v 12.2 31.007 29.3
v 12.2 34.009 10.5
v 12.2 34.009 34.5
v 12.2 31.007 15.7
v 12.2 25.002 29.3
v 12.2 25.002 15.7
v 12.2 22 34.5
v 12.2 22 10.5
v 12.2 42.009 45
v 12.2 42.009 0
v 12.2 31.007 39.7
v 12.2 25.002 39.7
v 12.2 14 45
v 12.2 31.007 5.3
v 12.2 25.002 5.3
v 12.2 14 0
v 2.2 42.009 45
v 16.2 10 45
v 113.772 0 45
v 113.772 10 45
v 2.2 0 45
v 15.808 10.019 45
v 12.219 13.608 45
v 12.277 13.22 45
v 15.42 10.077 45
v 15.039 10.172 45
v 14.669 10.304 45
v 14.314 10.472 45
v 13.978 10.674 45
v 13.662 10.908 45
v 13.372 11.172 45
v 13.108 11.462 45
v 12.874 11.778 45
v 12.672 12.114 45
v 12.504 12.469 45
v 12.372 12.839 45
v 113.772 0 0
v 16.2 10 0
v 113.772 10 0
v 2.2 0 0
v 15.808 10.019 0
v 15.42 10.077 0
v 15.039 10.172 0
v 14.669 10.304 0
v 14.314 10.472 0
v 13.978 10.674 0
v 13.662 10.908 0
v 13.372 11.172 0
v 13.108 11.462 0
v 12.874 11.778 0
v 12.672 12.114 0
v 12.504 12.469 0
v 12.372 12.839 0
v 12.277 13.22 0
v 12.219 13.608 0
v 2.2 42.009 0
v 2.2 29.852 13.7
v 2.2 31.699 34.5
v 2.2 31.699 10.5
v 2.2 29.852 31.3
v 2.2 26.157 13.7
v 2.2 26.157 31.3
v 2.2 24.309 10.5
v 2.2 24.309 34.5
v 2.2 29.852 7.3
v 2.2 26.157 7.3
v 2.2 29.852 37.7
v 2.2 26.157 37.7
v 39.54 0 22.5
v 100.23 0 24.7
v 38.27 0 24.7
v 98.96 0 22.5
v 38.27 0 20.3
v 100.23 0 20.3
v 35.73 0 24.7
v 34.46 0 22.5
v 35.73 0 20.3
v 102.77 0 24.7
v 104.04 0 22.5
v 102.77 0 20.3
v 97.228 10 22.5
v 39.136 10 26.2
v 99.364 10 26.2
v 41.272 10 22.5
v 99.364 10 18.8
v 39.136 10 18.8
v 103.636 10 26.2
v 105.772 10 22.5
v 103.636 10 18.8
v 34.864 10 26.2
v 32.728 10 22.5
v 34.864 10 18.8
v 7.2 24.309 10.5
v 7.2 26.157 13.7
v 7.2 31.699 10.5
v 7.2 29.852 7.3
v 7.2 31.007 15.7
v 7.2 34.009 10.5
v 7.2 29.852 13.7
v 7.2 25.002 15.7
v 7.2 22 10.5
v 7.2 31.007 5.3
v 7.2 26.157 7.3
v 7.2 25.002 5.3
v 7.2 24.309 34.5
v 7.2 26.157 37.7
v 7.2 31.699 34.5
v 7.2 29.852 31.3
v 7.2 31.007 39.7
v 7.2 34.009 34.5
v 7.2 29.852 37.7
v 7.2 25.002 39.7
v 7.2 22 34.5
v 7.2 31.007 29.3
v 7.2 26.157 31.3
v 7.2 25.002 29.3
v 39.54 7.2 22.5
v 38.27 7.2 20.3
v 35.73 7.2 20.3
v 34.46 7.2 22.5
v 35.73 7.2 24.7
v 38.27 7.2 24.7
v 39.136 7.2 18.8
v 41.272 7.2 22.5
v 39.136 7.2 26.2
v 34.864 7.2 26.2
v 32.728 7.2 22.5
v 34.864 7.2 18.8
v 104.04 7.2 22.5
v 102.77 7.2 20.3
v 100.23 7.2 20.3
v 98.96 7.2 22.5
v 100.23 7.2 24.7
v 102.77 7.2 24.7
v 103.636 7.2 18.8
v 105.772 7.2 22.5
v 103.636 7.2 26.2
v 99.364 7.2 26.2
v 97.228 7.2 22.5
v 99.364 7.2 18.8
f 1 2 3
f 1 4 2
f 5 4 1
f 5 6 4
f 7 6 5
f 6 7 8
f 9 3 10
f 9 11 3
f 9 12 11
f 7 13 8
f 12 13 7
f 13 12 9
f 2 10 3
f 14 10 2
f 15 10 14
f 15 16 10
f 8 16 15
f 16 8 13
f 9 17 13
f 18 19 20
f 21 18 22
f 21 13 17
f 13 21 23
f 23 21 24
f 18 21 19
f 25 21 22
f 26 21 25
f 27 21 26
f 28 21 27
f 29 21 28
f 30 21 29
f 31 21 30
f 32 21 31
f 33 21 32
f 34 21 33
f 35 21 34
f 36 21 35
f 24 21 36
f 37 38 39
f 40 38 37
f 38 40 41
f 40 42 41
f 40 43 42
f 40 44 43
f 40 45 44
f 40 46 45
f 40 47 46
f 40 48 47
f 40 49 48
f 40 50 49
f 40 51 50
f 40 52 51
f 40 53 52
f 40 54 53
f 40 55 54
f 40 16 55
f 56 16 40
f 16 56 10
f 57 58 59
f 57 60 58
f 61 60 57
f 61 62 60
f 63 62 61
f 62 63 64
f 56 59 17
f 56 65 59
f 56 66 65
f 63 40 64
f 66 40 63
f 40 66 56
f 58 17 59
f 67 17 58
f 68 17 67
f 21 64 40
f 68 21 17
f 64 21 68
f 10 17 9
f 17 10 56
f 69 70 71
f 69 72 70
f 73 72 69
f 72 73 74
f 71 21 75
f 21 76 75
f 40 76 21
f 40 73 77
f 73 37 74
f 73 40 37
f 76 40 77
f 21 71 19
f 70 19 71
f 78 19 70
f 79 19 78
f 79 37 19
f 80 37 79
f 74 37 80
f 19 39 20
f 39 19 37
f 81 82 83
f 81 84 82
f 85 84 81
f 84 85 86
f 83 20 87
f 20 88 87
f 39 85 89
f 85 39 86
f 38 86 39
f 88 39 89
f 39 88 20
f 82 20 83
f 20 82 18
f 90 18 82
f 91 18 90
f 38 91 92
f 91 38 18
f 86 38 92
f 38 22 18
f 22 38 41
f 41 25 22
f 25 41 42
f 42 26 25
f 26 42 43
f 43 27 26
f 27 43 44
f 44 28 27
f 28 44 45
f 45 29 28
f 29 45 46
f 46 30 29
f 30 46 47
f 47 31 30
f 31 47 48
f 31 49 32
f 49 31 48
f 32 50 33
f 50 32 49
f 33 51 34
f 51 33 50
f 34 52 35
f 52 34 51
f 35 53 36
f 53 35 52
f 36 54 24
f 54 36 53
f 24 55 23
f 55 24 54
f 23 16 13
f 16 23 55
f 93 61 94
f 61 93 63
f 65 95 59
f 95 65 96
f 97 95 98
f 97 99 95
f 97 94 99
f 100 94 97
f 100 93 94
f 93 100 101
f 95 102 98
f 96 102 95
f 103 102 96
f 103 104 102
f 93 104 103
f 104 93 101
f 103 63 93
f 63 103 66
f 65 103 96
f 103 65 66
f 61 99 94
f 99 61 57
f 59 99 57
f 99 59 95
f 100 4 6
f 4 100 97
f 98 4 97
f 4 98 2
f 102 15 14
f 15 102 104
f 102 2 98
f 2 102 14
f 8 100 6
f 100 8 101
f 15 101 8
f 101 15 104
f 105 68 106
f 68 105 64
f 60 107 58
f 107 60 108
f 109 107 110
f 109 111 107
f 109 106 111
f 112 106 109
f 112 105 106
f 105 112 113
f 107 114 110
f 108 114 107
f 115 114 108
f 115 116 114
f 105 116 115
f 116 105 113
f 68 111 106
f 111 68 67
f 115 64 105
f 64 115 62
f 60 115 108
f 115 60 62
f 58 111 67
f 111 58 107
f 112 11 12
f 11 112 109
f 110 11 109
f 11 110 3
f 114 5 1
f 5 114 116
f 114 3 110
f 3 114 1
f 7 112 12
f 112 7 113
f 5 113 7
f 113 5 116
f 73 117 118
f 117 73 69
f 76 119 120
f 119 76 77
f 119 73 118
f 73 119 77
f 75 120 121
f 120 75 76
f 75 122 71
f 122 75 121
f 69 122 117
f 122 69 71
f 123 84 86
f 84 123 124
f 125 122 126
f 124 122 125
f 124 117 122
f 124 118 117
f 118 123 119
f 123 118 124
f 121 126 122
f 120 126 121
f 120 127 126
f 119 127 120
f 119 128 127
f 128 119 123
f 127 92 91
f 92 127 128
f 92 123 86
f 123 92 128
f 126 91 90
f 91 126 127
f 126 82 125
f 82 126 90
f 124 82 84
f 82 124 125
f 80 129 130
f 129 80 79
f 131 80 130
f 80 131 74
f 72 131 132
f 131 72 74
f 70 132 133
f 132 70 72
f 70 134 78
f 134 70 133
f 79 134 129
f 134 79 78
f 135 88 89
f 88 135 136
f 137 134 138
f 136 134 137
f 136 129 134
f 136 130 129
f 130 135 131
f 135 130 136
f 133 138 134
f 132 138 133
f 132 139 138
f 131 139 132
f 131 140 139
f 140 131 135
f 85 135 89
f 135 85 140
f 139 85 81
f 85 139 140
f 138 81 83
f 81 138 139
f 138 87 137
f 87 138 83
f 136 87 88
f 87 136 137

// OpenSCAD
// file: ../../../modules/steel_rack.scad
use <bolts.scad>;

bolt_edge_offset = 15;
bolt_positions = [
  bolt_edge_offset,
  bolt_edge_offset + 98,
  bolt_edge_offset + 98 + 24,
];

module bolt_and_nut(y, h) {
  nut_thickness = 5;
  translate([0, y, h / 2])
    m6_bolt_hole(h + 1, center = true);
  translate([0, y, h - nut_thickness / 2])
    rotate([0, 0, 90])
    m6_nut_trap(nut_thickness, center = true);
}

module long_bar(w, y, h) {
  difference() {
    translate([w / 2, y / 2, h / 2])
      cube([w, y, h], center = true);

    for (x = bolt_positions) {
      translate([x, 0, 0])
        bolt_and_nut(y / 2, h);
    }
  }
}

module short_bar(w, y, h) {
  difference() {
    translate([w / 2, y / 2, h / 2])
      cube([w, y, h], center = true);

    translate([bolt_positions[0], 0, 0])
      bolt_and_nut(y / 2, h);
  }
}

module fillet_profile(r, h) {
  linear_extrude(height = h, center = true)
    difference() {
      square([r, r]);
      circle(r = r, $fn = 64);
    }
}
// file: ../../../modules/bolts.scad
module nut_trap(d, h, center = true) {
  linear_extrude(height = h, center = center)
  circle(d = d / cos(30), $fn = 6);
}

module bolt_hole(d, h, center = true) {
  linear_extrude(height = h, center = center)
  circle(d = d, $fn = 64);
}

// Hex holes for self-tapping (nominal - 0.2mm)
module hex_hole(flat_d, h) {
  linear_extrude(height = h, center = true)
  circle(d = flat_d / cos(30), $fn = 6);
}

module m3_bolt_hexhole(h) {
  rotate([0, 0, 90]) hex_hole(flat_d = 2.8, h = h);
}

module m4_bolt_hexhole(h) {
  rotate([0, 0, 90]) hex_hole(flat_d = 3.8, h = h);
}

module m6_bolt_hexhole(h) {
  rotate([0, 0, 90]) hex_hole(flat_d = 5.8, h = h);
}

module m8_bolt_hexhole(h) {
  rotate([0, 0, 90]) hex_hole(flat_d = 7.8, h = h);
}

// M3
module m3_bolt_hole(h, center = false) { bolt_hole(d = 3.4, h = h, center = center); }
module m3_nut_trap(h, center = false) { nut_trap(d = 5.7, h = h, center = center); }

// M4
module m4_bolt_hole(h, center = false) { bolt_hole(d = 4.4, h = h, center = center); }
module m4_nut_trap(h, center = false) { nut_trap(d = 7.5, h = h, center = center); }

// M6
module m6_bolt_hole(h, center = false) { bolt_hole(d = 6.2, h = h, center = center); }
module m6_nut_trap(h, center = false) { nut_trap(d = 10.2, h = h, center = center); }

// M8
module m8_bolt_hole(h, center = false) { bolt_hole(d = 8.4, h = h, center = center); }
module m8_nut_trap(h, center = false) { nut_trap(d = 13.3, h = h, center = center); }
// file: ../../../modules/slide_rail_outer_bracket.scad
use <bolts.scad>
use <steel_rack.scad>

// スライドレール外側とL字アングルを接合するL字ブラケット。
// 設計の経緯と確定値は ledger/designs/steel-rack-500x400.md が正本。
//
// 座標系 (部品自身の datum):
//   X = 0 がこの部品側のL字アングル外側面。部品はアングル板厚の内側から始まる
//   Y = 0 がスライドレール外側面。+Y がラック外側
//   Z = 0 が部品底面 (レール下端と一致)
// front は screw_x = [37, 101.5]、rear は [76.5, 172.5] を自分の datum
// から渡す。 M6 が高さ 22.5±12 の対称配置のため部品は Z 反転対称になり、
// 左右のレールにも上下反転するだけで同じ2部品を使い回せる。

bracket_height = 45;
flange_t = 10;
inner_r = 4;
m6_z = [ 10.5, 34.5 ];
// クリアランス基準: 呼び寸法 + 0.4mm (実プリントの嵌合結果から拡大)
m6_pass_flat = 6.4; // M6ボルト通し六角の二面幅 (手前5mm)
m6_nut_flat = 10.4; // M6ナット窪み六角の二面幅 (奥5mm、ナット実測10.0)
m6_stage_depth = 5;
screw_z = 22.5;
m4_pass_flat = 4.4; // M4小トラスネジ通し六角の二面幅
m4_nut_flat = 7.4; // M4ナット窪み六角の二面幅 (JIS規格7.0 + 0.4、実測は未)
m4_nut_depth = 2.8; // M4ナット窪みの深さ (user指定)
edge_margin = 8; // 穴の外縁から部品端までの余白 (自由な辺のみ)
angle_t = 2.2; // L字アングルの板厚

// 六角プリズム: 軸X・上下の辺が水平 (flat-up)。
// 天井を短い水平ブリッジにして垂れの改善を狙う
// (point-up だと天井面が水平から30°になり垂れた — 嵌合試験で確認済み)
module
hex_x_flat_up(flat_d, l)
{
    rotate([ 0, 90, 0 ]) rotate([ 0, 0, 90 ]) hex_hole(flat_d = flat_d, h = l);
}

// 六角プリズム: 軸Y・上下の辺が水平 (flat-up)。M6と同じくブリッジ天井
module
hex_y_flat_up(flat_d, l)
{
    rotate([ 90, 0, 0 ]) hex_hole(flat_d = flat_d, h = l);
}

module
slide_rail_outer_bracket(screw_x, name = "bracket")
{
    // flat-up配置では水平方向の穴半径は対角/2 (= 二面幅/(2*cos30))。
    // 8mm余白の契約はこの実半径に対して守る
    m6_nut_diag = m6_nut_flat / cos(30);
    m4_nut_diag = m4_nut_flat / cos(30);
    // 短辺のY寸法: 長辺厚 + 内側R + 余白 + M6六角(対角) + 余白
    m6_y = flange_t + inner_r + edge_margin + m6_nut_diag / 2;
    short_len = m6_y + m6_nut_diag / 2 + edge_margin;
    // 長辺のX終端: 最奥のM4穴の最大断面 (ナット窪みの対角の半分) + 余白
    arm_end = max(screw_x) + m4_nut_diag / 2 + edge_margin;

    echo(str("CONTRACT ", name, ": height = ", bracket_height));
    echo(str("CONTRACT ", name, ": flange_t = ", flange_t));
    echo(str("CONTRACT ", name, ": inner_r = ", inner_r));
    echo(str("CONTRACT ", name, ": m6_z = ", m6_z));
    echo(str("CONTRACT ", name, ": m6_pass_flat = ", m6_pass_flat));
    echo(str("CONTRACT ", name, ": m6_nut_flat = ", m6_nut_flat));
    echo(str("CONTRACT ", name, ": screw_z = ", screw_z));
    echo(str("CONTRACT ", name, ": m4_pass_flat = ", m4_pass_flat));
    echo(str("CONTRACT ", name, ": m4_nut_flat = ", m4_nut_flat));
    echo(str("CONTRACT ", name, ": m4_nut_depth = ", m4_nut_depth));
    echo(str("CONTRACT ", name, ": edge_margin = ", edge_margin));
    echo(str("CONTRACT ", name, ": angle_t = ", angle_t));
    echo(str("CONTRACT ", name, ": screw_x = ", screw_x));
    echo(str("CONTRACT ",
             name,
             ": m6_y = ",
             m6_y,
             ", short_len = ",
             short_len,
             ", arm_end = ",
             arm_end));

    // 余白の契約 (自由な辺のみ。高さ45とM6のZはuser固定値なので対象外)
    assert(m6_y - m6_nut_diag / 2 - (flange_t + inner_r) >= edge_margin,
           "M6 hole too close to the inner corner");
    assert(short_len - (m6_y + m6_nut_diag / 2) >= edge_margin,
           "M6 hole too close to the short-flange edge");
    assert(arm_end - (max(screw_x) + m4_nut_diag / 2) >= edge_margin,
           "M4 hole too close to the arm end");
    assert(min(screw_x) - m4_nut_diag / 2 >= angle_t + flange_t,
           "M4 hole overlaps the short flange");

    difference()
    {
        union()
        {
            // 短辺: アングル内側に当たる縦板 (M6で締結)
            translate([ angle_t, 0, 0 ])
                cube([ flange_t, short_len, bracket_height ]);

            // 長辺: レール外側面に当たる横板 (M4小トラスネジ+ナットで締結)
            translate([ angle_t, 0, 0 ])
                cube([ arm_end - angle_t, flange_t, bracket_height ]);

            // 内側コーナーのR4フィレット (応力集中の回避)
            translate([
                angle_t + flange_t + inner_r,
                flange_t + inner_r,
                bracket_height / 2
            ]) rotate([ 0, 0, 180 ]) fillet_profile(inner_r, bracket_height);
        }

        // M6の2段六角穴 (軸X・flat-up): 手前5mmが通し、奥5mmがナット窪み
        for (z = m6_z) {
            translate([ angle_t + m6_stage_depth / 2 - 0.05, m6_y, z ])
                hex_x_flat_up(m6_pass_flat, m6_stage_depth + 0.1);
            translate(
                [ angle_t + flange_t - m6_stage_depth / 2 + 0.05, m6_y, z ])
                hex_x_flat_up(m6_nut_flat, m6_stage_depth + 0.1);
        }

        // M4小トラスネジの穴 (軸Y・flat-up):
        // 通しは全厚を貫通し、L字の内側面 (y=10) から深さ2.8mmのナット窪み。
        // ネジはレール内側から刺さり
        // (トラス頭はスライダーと干渉しない実測済み)、
        // ナットが窪みの底で受けてレール板とブラケットを共締めする
        for (x = screw_x) {
            translate([ x, flange_t / 2, screw_z ])
                hex_y_flat_up(m4_pass_flat, flange_t + 0.2);
            translate([ x, flange_t - m4_nut_depth / 2 + 0.05, screw_z ])
                hex_y_flat_up(m4_nut_flat, m4_nut_depth + 0.1);
        }
    }
}
// main file
use <../../../modules/slide_rail_outer_bracket.scad>

// スライドレール外側ブラケット (手前)。
// datum: X=0 は手前側L字アングルの外側面。レール全長400mmは
// ラック奥行きとぴたり一致するため、木ネジ位置はこの基準の実測値そのまま。
// 印刷向き: L断面をビルドプレートへ寝かせる (層と平行に荷重を受ける)。
// 左右のレールには上下反転で同じ部品を使う (Z対称)。

// 初版 [34, 98] は実プリントで座標ズレが判明し、1個目+3mm・2個目+3.5mm
// 奥へ補正した (経緯は ledger/designs/steel-rack-500x400.md)
screw_x = [ 37, 101.5 ];

slide_rail_outer_bracket(screw_x = screw_x, name = "front");
